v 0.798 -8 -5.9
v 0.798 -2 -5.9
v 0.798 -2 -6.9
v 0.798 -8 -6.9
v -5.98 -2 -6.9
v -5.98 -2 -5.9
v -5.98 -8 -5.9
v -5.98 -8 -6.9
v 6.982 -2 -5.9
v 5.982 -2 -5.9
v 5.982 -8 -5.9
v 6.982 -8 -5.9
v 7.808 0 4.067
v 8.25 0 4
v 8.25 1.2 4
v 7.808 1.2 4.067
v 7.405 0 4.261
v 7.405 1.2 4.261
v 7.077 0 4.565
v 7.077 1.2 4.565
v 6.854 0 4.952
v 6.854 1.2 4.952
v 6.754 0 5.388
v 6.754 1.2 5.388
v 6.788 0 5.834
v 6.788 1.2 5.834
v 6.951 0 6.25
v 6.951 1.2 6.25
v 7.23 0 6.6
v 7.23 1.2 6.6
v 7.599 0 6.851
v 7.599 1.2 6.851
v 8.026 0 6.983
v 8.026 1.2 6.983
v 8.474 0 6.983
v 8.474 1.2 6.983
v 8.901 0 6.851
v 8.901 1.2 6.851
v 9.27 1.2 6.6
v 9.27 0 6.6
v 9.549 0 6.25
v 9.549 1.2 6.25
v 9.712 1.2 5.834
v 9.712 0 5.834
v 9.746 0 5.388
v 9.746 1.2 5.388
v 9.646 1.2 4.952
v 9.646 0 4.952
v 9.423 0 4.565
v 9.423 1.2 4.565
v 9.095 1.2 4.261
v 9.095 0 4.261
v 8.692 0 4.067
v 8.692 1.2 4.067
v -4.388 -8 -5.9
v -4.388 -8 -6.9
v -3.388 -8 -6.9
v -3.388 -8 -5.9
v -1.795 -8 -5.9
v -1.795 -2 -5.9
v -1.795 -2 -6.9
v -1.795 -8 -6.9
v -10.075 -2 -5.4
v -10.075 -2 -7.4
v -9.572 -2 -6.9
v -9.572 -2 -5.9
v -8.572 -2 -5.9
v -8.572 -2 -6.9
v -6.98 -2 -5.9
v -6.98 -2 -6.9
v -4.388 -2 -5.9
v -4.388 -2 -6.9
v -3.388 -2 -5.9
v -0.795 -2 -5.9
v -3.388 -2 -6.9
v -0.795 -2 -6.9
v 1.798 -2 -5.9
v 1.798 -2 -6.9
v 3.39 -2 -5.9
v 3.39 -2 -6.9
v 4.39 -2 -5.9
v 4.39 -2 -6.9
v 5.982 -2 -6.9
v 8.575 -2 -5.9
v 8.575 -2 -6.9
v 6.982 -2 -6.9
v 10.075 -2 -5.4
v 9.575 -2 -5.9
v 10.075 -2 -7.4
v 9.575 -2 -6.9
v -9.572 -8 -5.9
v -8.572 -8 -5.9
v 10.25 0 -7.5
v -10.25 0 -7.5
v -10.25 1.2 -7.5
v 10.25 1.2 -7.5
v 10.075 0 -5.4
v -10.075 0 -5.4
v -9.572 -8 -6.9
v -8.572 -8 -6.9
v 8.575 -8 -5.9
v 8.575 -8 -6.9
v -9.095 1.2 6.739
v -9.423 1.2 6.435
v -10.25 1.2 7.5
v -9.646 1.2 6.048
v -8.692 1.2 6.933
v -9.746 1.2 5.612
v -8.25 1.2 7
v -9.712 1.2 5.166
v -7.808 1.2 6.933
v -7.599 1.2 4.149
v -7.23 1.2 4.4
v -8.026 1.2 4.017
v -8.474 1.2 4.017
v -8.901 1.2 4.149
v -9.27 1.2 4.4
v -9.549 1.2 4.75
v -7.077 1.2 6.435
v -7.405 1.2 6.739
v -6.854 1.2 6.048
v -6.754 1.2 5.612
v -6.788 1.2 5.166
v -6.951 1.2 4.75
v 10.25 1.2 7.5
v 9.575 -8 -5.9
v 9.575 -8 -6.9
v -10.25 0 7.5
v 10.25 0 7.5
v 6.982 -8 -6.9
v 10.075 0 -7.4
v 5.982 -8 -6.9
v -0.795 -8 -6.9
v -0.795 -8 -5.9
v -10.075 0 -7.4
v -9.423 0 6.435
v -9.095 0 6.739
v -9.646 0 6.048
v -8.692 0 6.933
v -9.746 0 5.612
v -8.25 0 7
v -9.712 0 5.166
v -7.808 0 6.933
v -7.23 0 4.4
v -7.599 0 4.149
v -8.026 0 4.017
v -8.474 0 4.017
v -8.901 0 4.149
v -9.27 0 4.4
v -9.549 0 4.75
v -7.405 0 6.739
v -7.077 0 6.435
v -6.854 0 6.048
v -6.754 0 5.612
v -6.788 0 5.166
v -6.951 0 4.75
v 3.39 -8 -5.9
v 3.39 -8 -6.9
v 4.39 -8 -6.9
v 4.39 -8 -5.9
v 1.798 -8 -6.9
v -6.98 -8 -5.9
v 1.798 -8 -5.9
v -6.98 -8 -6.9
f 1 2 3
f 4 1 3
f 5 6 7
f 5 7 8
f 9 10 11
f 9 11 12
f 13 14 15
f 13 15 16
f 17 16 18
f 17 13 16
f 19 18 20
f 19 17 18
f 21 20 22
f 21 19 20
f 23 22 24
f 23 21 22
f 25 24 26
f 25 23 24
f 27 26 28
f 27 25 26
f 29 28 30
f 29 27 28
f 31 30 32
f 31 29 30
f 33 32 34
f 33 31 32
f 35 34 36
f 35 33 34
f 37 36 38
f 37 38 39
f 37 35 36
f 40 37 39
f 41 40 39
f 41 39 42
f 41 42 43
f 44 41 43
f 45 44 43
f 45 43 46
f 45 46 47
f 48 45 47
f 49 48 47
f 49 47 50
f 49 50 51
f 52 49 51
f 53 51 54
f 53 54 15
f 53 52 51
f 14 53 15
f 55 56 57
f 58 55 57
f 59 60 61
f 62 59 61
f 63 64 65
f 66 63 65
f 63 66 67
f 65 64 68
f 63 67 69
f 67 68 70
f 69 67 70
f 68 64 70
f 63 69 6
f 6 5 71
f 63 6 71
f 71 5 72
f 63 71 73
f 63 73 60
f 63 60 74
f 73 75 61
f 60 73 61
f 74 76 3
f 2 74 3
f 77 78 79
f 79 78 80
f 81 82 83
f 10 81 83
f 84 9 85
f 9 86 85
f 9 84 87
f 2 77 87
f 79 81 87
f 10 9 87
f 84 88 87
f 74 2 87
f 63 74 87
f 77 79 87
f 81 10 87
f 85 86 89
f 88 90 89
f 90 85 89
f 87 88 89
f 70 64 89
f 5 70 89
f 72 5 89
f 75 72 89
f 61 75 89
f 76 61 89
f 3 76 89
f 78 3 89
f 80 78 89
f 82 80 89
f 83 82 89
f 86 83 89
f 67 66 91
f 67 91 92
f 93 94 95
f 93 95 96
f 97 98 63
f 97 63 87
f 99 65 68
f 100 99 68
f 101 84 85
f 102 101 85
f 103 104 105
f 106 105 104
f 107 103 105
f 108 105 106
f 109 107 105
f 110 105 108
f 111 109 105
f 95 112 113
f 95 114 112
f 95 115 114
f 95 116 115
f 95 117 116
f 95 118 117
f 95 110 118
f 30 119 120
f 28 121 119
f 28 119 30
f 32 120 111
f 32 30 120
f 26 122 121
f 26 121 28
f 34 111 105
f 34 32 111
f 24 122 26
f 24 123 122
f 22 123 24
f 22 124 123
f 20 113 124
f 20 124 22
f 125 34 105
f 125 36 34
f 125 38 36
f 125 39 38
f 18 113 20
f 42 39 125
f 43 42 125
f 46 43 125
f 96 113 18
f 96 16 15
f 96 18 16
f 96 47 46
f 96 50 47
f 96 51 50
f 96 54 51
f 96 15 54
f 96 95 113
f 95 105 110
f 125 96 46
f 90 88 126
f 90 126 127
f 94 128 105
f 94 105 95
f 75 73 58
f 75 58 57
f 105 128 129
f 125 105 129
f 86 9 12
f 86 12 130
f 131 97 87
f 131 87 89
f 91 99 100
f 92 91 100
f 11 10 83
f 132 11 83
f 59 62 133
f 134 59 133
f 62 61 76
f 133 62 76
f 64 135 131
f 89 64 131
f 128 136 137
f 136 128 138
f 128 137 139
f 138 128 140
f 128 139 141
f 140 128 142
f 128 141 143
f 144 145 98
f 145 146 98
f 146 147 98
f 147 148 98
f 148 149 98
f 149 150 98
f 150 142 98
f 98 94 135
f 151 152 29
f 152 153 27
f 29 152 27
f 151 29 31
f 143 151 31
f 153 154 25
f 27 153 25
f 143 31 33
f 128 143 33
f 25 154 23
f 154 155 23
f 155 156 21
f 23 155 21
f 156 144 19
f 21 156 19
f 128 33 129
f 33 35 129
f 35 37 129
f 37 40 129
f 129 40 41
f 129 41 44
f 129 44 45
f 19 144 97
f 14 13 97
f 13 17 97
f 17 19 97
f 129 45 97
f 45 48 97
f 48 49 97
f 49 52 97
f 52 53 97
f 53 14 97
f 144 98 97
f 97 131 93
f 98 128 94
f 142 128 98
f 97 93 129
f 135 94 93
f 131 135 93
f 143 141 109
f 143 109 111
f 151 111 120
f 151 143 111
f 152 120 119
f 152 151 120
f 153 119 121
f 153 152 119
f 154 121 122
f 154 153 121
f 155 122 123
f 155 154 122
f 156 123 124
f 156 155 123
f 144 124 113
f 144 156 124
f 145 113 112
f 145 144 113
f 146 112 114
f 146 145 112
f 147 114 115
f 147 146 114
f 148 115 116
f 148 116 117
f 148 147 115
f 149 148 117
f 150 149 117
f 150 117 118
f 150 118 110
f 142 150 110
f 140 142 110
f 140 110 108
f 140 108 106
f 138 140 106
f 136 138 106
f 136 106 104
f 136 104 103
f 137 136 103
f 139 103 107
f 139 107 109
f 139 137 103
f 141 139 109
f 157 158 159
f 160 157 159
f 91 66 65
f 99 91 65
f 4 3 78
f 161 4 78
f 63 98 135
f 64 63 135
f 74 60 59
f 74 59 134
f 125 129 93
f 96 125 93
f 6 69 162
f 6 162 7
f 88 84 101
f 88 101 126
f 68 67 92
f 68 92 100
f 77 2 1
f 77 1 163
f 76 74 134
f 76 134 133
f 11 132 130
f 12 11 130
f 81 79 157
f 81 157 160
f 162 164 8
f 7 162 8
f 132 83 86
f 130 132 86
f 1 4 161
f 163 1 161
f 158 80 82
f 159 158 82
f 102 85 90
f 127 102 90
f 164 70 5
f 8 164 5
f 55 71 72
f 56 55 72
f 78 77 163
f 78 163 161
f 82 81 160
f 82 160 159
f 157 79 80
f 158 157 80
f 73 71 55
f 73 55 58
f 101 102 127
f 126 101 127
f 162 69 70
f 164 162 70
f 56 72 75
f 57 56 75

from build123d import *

# Parameters (mm, degrees)
SKETCH1_W           = 20.5
SKETCH1_H           = 15
SKETCH1_R           = 1.5
BOSS_EXTRUDE1_DEPTH = 1.2
SKETCH2_W           = 1
SKETCH2_H           = 1
BOSS_EXTRUDE2_DEPTH = 8
SKETCH3_W           = 20.15
SKETCH3_H           = 2
BOSS_EXTRUDE3_DEPTH = 2


with BuildPart() as part:
    # Sketch1 → Boss-Extrude1 (new body)
    with BuildSketch(Plane(origin=(0, 0, 0), x_dir=(1, 0, 0), z_dir=(0, 1, 0))):
        Rectangle(SKETCH1_W, SKETCH1_H)
        with Locations(Location((-8.25, -5.5, 0), (0, 0, 270))):
            Circle(SKETCH1_R, mode=Mode.SUBTRACT)
        with Locations(Location((8.25, -5.5, 0), (0, 0, 90))):
            Circle(SKETCH1_R, mode=Mode.SUBTRACT)
    extrude(amount=BOSS_EXTRUDE1_DEPTH)

    # Sketch2 → Boss-Extrude2 (add)
    with BuildSketch(Plane(origin=(0, 0, 0), x_dir=(1, 0, 0), z_dir=(0, 1, 0))):
        with Locations((9.075, 6.4)):
            Rectangle(SKETCH2_W, SKETCH2_H)
        with Locations((6.4825, 6.4)):
            Rectangle(SKETCH2_W, SKETCH2_H)
        with Locations((3.89, 6.4)):
            Rectangle(SKETCH2_W, SKETCH2_H)
        with Locations((1.2975, 6.4)):
            Rectangle(SKETCH2_W, SKETCH2_H)
        with Locations((-1.295, 6.4)):
            Rectangle(SKETCH2_W, SKETCH2_H)
        with Locations((-3.8875, 6.4)):
            Rectangle(SKETCH2_W, SKETCH2_H)
        with Locations((-6.48, 6.4)):
            Rectangle(SKETCH2_W, SKETCH2_H)
        with Locations((-9.0725, 6.4)):
            Rectangle(SKETCH2_W, SKETCH2_H)
    extrude(amount=-BOSS_EXTRUDE2_DEPTH)

    # Sketch3 → Boss-Extrude3 (add)
    with BuildSketch(Plane(origin=(0, 0, 0), x_dir=(1, 0, 0), z_dir=(0, 1, 0))):
        with Locations((0, 6.4)):
            Rectangle(SKETCH3_W, SKETCH3_H)
    extrude(amount=-BOSS_EXTRUDE3_DEPTH)


solid = part.part
